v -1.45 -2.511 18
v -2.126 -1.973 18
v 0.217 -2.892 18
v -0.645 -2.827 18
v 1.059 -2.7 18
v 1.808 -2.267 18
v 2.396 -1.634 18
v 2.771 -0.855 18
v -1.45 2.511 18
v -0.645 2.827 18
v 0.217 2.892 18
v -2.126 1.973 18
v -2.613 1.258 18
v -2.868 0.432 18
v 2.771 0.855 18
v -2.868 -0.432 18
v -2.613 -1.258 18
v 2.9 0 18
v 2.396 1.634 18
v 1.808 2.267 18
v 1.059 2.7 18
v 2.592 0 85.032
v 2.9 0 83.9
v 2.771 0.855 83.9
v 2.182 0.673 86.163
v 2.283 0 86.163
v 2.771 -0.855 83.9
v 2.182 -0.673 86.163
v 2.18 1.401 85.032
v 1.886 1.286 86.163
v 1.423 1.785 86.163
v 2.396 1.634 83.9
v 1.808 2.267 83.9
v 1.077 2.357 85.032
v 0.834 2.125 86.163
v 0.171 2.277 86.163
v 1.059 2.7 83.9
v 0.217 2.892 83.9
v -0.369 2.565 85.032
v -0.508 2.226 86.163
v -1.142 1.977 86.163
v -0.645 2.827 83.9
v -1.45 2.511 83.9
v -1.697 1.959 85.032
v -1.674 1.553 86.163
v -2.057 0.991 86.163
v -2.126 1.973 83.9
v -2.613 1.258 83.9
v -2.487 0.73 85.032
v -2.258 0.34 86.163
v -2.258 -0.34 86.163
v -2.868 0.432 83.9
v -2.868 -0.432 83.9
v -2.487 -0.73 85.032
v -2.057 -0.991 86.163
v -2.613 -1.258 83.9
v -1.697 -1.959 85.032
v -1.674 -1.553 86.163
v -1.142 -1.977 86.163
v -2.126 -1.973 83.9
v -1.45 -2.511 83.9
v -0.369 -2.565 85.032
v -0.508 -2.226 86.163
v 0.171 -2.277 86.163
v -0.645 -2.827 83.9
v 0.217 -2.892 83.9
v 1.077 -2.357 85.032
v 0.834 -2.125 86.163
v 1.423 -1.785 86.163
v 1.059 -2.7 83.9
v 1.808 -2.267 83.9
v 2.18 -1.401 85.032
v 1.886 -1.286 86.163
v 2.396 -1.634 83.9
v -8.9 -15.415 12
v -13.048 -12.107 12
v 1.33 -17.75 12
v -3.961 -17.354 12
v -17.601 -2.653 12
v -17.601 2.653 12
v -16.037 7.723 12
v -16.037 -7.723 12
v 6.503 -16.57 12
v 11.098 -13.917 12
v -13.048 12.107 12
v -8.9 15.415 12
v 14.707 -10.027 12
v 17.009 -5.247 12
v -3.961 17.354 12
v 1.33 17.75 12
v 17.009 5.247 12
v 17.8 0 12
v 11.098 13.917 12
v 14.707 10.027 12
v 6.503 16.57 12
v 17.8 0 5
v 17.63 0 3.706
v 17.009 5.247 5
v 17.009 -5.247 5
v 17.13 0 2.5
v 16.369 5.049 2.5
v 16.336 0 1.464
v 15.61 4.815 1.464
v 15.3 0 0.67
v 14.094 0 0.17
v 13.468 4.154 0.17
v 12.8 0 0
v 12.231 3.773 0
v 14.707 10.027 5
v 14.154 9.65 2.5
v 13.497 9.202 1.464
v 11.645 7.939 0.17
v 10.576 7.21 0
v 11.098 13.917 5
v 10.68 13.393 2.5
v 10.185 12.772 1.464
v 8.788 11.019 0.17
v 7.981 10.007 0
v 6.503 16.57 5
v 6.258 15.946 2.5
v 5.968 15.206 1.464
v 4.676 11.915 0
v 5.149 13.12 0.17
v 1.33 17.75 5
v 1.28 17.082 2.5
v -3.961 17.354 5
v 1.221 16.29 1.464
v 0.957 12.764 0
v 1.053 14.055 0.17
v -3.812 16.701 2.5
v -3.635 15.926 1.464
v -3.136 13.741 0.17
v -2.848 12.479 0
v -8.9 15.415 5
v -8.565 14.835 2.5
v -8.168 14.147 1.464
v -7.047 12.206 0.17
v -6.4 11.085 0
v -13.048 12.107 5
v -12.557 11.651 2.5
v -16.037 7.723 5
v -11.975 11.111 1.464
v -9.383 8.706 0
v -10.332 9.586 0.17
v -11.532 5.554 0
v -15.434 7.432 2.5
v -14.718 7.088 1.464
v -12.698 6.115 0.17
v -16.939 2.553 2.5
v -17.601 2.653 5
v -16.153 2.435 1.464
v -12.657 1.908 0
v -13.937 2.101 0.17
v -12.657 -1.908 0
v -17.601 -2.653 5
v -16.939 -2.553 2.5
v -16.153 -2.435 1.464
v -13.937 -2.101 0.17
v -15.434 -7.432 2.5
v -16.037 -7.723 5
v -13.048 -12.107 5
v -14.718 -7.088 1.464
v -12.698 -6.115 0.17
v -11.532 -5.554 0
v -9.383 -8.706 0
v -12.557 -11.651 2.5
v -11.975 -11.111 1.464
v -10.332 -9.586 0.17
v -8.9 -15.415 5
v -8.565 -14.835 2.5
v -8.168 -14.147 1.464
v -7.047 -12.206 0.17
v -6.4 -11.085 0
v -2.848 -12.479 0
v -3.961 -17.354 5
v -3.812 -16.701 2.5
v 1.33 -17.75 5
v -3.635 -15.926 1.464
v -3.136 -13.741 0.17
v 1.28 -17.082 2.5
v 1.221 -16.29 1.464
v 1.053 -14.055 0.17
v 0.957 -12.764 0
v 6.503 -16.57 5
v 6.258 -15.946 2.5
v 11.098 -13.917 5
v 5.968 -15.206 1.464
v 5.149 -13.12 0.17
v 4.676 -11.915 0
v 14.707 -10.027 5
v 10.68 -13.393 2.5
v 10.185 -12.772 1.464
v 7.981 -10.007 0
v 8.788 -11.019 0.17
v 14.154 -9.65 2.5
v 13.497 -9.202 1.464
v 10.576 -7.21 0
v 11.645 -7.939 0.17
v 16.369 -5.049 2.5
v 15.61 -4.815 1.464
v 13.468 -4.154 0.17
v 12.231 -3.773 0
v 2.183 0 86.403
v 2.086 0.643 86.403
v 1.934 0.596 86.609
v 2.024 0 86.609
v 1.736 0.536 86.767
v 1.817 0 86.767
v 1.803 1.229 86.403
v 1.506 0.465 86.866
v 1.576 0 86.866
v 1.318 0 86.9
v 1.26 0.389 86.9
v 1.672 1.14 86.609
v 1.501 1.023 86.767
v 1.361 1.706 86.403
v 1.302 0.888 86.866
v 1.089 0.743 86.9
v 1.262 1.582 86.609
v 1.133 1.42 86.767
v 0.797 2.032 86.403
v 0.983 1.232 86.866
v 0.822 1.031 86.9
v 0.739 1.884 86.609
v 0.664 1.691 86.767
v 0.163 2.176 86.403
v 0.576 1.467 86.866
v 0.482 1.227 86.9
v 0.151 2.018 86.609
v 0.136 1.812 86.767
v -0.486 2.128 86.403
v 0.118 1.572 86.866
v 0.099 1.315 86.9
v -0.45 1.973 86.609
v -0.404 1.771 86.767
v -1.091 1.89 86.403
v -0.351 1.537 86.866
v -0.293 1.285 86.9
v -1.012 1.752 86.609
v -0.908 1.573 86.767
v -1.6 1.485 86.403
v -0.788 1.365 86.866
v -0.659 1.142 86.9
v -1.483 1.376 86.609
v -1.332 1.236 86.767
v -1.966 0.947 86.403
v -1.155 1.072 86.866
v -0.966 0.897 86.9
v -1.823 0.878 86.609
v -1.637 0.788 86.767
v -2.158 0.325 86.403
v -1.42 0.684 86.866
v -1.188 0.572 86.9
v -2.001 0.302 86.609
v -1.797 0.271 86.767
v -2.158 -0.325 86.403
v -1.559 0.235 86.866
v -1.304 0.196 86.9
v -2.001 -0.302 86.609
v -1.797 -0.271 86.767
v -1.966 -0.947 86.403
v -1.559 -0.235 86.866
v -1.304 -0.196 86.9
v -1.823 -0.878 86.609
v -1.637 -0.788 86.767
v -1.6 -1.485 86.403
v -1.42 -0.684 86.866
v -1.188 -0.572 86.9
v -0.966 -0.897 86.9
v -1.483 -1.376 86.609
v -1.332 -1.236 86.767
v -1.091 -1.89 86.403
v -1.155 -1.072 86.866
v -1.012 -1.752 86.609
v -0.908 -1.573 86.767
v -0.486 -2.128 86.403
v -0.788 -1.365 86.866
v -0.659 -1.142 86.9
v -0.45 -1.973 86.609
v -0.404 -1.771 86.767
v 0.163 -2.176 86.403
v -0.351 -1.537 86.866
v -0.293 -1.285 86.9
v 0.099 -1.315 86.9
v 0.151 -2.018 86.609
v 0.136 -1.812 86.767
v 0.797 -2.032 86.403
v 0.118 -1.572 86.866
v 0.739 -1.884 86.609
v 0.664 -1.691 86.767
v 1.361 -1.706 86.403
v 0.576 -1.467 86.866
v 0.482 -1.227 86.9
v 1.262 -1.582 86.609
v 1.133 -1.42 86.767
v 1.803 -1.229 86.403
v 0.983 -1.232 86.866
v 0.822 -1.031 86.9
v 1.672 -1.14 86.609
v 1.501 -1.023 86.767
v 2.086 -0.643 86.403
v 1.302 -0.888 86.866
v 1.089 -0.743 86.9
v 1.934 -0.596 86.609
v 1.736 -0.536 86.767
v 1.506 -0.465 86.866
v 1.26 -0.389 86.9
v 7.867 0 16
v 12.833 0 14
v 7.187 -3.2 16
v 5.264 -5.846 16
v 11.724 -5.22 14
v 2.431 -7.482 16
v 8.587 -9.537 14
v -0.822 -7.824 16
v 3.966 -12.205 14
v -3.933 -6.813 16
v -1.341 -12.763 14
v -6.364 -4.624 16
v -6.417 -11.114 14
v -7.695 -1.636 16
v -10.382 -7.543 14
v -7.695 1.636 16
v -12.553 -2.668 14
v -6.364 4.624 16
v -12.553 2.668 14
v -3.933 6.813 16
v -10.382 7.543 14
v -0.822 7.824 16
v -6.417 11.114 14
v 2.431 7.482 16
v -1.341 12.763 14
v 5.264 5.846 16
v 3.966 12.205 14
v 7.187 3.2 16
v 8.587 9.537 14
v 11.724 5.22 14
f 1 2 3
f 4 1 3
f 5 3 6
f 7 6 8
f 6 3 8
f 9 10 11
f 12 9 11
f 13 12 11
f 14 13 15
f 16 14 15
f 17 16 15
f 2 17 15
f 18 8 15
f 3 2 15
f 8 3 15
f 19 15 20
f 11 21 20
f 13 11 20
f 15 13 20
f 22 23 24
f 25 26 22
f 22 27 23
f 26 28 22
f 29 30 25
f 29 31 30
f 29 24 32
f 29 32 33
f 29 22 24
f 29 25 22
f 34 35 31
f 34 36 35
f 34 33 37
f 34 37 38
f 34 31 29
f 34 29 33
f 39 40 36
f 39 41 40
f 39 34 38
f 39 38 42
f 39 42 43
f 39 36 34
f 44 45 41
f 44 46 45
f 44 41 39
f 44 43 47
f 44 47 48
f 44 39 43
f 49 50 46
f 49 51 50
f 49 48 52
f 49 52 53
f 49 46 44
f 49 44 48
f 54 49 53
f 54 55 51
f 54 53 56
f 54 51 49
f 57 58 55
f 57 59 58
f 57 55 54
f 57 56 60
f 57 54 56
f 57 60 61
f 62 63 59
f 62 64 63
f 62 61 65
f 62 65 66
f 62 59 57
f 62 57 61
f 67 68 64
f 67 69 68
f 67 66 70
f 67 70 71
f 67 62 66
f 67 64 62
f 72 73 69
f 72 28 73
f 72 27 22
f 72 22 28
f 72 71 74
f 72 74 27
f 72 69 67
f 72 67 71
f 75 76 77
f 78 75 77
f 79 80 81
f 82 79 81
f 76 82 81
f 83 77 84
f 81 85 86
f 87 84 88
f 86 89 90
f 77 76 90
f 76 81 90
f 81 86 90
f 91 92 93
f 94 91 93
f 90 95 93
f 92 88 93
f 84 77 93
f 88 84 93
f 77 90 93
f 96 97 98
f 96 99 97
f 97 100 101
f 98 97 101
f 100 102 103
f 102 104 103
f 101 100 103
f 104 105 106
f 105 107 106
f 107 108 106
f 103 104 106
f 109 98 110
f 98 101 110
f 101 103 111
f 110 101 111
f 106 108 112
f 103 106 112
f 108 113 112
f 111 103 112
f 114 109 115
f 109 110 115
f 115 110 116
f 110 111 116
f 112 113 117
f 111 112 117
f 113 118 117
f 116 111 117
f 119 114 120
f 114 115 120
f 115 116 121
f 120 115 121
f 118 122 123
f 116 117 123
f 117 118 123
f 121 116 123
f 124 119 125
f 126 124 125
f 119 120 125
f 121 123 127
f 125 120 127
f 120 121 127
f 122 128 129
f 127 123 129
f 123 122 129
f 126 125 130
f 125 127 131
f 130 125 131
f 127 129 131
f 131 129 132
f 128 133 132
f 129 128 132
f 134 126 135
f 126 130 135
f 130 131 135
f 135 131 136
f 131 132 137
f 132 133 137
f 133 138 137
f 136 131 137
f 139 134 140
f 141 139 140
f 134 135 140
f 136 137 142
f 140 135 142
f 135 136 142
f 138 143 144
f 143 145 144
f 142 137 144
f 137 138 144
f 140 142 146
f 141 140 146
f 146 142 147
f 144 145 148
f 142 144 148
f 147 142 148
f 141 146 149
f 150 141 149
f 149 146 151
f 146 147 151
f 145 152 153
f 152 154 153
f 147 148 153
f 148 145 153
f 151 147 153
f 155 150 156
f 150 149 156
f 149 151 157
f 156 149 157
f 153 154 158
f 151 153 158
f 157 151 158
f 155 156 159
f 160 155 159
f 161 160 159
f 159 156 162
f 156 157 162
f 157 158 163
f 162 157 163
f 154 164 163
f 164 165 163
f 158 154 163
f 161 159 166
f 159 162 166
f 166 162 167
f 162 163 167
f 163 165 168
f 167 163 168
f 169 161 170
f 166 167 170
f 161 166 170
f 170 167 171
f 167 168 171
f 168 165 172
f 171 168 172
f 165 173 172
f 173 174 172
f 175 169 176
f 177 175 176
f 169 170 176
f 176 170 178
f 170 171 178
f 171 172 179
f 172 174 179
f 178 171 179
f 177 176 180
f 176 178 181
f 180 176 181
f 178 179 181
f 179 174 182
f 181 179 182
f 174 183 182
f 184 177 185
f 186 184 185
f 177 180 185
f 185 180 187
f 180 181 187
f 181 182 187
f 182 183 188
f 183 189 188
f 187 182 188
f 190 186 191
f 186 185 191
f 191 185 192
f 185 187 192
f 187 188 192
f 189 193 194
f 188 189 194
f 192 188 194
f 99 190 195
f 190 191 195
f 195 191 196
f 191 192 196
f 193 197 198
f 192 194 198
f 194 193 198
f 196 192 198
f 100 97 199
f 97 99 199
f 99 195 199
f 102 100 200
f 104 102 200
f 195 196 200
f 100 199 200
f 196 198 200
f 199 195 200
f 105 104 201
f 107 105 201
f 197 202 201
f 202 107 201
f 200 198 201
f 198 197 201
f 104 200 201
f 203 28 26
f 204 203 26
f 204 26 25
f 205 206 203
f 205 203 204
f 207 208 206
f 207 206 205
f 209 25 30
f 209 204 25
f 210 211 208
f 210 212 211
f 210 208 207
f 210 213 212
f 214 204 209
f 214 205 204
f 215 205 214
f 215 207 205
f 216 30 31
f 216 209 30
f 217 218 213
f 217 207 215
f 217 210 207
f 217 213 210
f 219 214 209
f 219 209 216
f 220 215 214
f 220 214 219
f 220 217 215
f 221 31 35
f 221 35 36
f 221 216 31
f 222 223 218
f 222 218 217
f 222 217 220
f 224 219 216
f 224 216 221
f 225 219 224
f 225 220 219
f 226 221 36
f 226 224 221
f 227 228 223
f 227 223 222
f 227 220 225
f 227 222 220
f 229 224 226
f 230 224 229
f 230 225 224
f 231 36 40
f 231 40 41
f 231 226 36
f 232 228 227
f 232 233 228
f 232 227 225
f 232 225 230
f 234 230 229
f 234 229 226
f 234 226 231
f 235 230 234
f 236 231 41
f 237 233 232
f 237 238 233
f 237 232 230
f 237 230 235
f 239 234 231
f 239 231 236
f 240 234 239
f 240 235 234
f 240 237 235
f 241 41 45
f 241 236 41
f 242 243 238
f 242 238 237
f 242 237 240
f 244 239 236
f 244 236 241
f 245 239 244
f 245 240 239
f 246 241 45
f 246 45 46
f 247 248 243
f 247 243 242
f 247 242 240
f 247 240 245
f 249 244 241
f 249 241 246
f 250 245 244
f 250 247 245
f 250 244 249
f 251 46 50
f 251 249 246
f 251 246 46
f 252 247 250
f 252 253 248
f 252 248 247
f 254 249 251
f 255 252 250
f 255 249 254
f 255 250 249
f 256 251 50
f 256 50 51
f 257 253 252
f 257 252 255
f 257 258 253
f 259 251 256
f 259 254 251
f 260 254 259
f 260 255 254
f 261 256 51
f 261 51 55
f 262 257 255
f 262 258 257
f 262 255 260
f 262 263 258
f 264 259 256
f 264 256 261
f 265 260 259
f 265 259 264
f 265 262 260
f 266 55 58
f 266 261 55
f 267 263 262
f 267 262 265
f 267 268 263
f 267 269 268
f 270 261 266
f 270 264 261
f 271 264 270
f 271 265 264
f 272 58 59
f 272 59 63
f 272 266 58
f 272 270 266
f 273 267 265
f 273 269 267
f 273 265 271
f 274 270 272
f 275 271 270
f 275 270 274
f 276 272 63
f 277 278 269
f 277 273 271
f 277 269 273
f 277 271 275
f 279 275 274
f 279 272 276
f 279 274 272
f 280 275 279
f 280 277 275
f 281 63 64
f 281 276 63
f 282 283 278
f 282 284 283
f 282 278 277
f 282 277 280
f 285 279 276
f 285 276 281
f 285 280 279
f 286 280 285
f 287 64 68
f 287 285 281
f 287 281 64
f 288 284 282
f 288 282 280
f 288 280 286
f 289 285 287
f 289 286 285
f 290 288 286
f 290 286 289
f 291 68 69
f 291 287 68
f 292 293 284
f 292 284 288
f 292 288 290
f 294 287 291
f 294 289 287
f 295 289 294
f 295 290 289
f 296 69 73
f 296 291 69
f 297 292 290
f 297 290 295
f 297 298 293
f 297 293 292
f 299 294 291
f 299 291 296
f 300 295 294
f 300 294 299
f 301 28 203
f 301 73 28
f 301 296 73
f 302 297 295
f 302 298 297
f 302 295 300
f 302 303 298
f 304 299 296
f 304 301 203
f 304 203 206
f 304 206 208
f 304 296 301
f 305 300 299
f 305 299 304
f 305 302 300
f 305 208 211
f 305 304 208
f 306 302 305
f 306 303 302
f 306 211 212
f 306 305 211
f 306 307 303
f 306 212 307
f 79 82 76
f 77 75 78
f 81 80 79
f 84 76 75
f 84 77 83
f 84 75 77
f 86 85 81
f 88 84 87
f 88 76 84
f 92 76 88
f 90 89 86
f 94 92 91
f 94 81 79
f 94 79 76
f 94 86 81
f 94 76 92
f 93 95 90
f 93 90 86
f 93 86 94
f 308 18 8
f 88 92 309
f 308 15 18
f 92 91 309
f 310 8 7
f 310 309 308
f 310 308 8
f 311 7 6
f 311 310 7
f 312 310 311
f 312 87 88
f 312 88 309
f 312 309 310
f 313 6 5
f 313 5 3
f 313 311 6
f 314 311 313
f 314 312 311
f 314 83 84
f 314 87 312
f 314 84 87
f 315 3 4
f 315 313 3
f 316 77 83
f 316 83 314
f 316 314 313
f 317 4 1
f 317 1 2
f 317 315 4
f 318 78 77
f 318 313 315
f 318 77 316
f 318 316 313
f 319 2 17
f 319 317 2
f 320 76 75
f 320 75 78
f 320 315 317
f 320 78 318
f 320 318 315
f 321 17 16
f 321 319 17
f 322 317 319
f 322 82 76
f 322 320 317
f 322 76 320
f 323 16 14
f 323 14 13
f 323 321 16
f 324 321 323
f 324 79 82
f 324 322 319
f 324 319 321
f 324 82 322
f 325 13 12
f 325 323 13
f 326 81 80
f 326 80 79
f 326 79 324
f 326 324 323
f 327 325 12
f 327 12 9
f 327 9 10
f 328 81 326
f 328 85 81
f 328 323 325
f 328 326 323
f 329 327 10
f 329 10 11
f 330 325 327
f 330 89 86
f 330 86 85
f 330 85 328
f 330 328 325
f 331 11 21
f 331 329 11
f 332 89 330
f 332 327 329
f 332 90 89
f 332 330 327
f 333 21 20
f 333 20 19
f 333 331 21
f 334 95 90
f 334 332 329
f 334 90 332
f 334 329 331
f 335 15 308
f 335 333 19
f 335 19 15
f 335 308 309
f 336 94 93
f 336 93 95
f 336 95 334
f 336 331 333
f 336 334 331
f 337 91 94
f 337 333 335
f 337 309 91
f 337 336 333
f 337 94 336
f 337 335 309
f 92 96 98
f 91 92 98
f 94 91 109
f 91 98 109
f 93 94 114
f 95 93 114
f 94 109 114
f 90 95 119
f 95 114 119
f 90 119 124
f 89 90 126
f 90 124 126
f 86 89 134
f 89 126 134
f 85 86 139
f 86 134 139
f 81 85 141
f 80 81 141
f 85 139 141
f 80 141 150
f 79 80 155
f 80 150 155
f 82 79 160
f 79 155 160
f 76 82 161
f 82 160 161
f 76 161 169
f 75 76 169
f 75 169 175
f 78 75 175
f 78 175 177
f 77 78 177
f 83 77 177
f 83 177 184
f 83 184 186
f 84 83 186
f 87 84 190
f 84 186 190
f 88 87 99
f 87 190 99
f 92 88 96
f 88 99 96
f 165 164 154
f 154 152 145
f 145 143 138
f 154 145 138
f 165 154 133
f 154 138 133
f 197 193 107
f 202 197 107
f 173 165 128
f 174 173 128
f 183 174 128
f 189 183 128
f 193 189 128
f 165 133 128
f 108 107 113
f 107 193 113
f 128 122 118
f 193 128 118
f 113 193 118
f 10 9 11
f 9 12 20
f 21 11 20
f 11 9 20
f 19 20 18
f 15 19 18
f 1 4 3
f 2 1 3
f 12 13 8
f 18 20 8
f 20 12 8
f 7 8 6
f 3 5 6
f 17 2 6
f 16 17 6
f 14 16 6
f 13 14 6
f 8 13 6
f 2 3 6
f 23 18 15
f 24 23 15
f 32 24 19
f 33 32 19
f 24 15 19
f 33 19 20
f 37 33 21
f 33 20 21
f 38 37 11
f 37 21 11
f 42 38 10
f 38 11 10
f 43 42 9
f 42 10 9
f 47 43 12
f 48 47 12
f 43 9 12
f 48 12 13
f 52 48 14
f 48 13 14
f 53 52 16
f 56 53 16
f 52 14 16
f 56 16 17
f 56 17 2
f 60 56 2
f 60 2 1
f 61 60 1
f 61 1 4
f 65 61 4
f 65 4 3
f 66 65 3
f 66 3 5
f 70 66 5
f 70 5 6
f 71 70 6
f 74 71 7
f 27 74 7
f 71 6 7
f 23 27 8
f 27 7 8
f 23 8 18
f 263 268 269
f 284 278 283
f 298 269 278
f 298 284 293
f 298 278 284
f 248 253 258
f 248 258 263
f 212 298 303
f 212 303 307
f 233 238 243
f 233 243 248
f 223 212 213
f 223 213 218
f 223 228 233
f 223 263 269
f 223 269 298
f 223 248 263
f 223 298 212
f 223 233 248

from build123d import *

# Parameters (mm, degrees)
F0_R       = 17.8
F3_DEPTH   = 12
F2_R       = 2.9
F4_DEPTH   = 65.9
F4_FACE_R  = 2.9
F3_FACE_R  = 17.8
F4_FACE1_R = 2.9
F7_R       = 2.0821822951
F9_R       = 1
F10_R      = 5


with BuildPart() as f3:
    # F0 (on Top) → F3 (new body)
    with BuildSketch(Plane.XY):
        Circle(F0_R)
    extrude(amount=F3_DEPTH)

    # F10
    f10_edges = [f3.edges().sort_by_distance(p)[0] for p in [
        (-17.8, 0, 0),
    ]]
    fillet(f10_edges, radius=F10_R)


with BuildPart() as f4:
    # F2 (on offset) → F4 (new body)
    with BuildSketch(Plane.XY.offset(18)):
        Circle(F2_R)
    extrude(amount=F4_DEPTH)

    # F4_face1 (on face) → F8 section 0
    with BuildSketch(Plane.XY.offset(83.9)):
        Circle(F4_FACE1_R)
    # F7 (on offset) → F8 section 1
    with BuildSketch(Plane.XY.offset(86.9)):
        Circle(F7_R)
    loft()

    # F9
    f9_edges = [f4.edges().sort_by_distance(p)[0] for p in [
        (-2.082182, 0, 86.9),
    ]]
    fillet(f9_edges, radius=F9_R)


with BuildPart() as f5:
    # F4_face (on face) → F5 section 0
    with BuildSketch(Plane(origin=(0, 0, 18), x_dir=(1, 0, 0), z_dir=(0, 0, -1))):
        Circle(F4_FACE_R)
    # F3_face (on face) → F5 section 1
    with BuildSketch(Plane.XY.offset(12)):
        Circle(F3_FACE_R)
    loft()


solid = Compound([f3.part, f4.part, f5.part])
